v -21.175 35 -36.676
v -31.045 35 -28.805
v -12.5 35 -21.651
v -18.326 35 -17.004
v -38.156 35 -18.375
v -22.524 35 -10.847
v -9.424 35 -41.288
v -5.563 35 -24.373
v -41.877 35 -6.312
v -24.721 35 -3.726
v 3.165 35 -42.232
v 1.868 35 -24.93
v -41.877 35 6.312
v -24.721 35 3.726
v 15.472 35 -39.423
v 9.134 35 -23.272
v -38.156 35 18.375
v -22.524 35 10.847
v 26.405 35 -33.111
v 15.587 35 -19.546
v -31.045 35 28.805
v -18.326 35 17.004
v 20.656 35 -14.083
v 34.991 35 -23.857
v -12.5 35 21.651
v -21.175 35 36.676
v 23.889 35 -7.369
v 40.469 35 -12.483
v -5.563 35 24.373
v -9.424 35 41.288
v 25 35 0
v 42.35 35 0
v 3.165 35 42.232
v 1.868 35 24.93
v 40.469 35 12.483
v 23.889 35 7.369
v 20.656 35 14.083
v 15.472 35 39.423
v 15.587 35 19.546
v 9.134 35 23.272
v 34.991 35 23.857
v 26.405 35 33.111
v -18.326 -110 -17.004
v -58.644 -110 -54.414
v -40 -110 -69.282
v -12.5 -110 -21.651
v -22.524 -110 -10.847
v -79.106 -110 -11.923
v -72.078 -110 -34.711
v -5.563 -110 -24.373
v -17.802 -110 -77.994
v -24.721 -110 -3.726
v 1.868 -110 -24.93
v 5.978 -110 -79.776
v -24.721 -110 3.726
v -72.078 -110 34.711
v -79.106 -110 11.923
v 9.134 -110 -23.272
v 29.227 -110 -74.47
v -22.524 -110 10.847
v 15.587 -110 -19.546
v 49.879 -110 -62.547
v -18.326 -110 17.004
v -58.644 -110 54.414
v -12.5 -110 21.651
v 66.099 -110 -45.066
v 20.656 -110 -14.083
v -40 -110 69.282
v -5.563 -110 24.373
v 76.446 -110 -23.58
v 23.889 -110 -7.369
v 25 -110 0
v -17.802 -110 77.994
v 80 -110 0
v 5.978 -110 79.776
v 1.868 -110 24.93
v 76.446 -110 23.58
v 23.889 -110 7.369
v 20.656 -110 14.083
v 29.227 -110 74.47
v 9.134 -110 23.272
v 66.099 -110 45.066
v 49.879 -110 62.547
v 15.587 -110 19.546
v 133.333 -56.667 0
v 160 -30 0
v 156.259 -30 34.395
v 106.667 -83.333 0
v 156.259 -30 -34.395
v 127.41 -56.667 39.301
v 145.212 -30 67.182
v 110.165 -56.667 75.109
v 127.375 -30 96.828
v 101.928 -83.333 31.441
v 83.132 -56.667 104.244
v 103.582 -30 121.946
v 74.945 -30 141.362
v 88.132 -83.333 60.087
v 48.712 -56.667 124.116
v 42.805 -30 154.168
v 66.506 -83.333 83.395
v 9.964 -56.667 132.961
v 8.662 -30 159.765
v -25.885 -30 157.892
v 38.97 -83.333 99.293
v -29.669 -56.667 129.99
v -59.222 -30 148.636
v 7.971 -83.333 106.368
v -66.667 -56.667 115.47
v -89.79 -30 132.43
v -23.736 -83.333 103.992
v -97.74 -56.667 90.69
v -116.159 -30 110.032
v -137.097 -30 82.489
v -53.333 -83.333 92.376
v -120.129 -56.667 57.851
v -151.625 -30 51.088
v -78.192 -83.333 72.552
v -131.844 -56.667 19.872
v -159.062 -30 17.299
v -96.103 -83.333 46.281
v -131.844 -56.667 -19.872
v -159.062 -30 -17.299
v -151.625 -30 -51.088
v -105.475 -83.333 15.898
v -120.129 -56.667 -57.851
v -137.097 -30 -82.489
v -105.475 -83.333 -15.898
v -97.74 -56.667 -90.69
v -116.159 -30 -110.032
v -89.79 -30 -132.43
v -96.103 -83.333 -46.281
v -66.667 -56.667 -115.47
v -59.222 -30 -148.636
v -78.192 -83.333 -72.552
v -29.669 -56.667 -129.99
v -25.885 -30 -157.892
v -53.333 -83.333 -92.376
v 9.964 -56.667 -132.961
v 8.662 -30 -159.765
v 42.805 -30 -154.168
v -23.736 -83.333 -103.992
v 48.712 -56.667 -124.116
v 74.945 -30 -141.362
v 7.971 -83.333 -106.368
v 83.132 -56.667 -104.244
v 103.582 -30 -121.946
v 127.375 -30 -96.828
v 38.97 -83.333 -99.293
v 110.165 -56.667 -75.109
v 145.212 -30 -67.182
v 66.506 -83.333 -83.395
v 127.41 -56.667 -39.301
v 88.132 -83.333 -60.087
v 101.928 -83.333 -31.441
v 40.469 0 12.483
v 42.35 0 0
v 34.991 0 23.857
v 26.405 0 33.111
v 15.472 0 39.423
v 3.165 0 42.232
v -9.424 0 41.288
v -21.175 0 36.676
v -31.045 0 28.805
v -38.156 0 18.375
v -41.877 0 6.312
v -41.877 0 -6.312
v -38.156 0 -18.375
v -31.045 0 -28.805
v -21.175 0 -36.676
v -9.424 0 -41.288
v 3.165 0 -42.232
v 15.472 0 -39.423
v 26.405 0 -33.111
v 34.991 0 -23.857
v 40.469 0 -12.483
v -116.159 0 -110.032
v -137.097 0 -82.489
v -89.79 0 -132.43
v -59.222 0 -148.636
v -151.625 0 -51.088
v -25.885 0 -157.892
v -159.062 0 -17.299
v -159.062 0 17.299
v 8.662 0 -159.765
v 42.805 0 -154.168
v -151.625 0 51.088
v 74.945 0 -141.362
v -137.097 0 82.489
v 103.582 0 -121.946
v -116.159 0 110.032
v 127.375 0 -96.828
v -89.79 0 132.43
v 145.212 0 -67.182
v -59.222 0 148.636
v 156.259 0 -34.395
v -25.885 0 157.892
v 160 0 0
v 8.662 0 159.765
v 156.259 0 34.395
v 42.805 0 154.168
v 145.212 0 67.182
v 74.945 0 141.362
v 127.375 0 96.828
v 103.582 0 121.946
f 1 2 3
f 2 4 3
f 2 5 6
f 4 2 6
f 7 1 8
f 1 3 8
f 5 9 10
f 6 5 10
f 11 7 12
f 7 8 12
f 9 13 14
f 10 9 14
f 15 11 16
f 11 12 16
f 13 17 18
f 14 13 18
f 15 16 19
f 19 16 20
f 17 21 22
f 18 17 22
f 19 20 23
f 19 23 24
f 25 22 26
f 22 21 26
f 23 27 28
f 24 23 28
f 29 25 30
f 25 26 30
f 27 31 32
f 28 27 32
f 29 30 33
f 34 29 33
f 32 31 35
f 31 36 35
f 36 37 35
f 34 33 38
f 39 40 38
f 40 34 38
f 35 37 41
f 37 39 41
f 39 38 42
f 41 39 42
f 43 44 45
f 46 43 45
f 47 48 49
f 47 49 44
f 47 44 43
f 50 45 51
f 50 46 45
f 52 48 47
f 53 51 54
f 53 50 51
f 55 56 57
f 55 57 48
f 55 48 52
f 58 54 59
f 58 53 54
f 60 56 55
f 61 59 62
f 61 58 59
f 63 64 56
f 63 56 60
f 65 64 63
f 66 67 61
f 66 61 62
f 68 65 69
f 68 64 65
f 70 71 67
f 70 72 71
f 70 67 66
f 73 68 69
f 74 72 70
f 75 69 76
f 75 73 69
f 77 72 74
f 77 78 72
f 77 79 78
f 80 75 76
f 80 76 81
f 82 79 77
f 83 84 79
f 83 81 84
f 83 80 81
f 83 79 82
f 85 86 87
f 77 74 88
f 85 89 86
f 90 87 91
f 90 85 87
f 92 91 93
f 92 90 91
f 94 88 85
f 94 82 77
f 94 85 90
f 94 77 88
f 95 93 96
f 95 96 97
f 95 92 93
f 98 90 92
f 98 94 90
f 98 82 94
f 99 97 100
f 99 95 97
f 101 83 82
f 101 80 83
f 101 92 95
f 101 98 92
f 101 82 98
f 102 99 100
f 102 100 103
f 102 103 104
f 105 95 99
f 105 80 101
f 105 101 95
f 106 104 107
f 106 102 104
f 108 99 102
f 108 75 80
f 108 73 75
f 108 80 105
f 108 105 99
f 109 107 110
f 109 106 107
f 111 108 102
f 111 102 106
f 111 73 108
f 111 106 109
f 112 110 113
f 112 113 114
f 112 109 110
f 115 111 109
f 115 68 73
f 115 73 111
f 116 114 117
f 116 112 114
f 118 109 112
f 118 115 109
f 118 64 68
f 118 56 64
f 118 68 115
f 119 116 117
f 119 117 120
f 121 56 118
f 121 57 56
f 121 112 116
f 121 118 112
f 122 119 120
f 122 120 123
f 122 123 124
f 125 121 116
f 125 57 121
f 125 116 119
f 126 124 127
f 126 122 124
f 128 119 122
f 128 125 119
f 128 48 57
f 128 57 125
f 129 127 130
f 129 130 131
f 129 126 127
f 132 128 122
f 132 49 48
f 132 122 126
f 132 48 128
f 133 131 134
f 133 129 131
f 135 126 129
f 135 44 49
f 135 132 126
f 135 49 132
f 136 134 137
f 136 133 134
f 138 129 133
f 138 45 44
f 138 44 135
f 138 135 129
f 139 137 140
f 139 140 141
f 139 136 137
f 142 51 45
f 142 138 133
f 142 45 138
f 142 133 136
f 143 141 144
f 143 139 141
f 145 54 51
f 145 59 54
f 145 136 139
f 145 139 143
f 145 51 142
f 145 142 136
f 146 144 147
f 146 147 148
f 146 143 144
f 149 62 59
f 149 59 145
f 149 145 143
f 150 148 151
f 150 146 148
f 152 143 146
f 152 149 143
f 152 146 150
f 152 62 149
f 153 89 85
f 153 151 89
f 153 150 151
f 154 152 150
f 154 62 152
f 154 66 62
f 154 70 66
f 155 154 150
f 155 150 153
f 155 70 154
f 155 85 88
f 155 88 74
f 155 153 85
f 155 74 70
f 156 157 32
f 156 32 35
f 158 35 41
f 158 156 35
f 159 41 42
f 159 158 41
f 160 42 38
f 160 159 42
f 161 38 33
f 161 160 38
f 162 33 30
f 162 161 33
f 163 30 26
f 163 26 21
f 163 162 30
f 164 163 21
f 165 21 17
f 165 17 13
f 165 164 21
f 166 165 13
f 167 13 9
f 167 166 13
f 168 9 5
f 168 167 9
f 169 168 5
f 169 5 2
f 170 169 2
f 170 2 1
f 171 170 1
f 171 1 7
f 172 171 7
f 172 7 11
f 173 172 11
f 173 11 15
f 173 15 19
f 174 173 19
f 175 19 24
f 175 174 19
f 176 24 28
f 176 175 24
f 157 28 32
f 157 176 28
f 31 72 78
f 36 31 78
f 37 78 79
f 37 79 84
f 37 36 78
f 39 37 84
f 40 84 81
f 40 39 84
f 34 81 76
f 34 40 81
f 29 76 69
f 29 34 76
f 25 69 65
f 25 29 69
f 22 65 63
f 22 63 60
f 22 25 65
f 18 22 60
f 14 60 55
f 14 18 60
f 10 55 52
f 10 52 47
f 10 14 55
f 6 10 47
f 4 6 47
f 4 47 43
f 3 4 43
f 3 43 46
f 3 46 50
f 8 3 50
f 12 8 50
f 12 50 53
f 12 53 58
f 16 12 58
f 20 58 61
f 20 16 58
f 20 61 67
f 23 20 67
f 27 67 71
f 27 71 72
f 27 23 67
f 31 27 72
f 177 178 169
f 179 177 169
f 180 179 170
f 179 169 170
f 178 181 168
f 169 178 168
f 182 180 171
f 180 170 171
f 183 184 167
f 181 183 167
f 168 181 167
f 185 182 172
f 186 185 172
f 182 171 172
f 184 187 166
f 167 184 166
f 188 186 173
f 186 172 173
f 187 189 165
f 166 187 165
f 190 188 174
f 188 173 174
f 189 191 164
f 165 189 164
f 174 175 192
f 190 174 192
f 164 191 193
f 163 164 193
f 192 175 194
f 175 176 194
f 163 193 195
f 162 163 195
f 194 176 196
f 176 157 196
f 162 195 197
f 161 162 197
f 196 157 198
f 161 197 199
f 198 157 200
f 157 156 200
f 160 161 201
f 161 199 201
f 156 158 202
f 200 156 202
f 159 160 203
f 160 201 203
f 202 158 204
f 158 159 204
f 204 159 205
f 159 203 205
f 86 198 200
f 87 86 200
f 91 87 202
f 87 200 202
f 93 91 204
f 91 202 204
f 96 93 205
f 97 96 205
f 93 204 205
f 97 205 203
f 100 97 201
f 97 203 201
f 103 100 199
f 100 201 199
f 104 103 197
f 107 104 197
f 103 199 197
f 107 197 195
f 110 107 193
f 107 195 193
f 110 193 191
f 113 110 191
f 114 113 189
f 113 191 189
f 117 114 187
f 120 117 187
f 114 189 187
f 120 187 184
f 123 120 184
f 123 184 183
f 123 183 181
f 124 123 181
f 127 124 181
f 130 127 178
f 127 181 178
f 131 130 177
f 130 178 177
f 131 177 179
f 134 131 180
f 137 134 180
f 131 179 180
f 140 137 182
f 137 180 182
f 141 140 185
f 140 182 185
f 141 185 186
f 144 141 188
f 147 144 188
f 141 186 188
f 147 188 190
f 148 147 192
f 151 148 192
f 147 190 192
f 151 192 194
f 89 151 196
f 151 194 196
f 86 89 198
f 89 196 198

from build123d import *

# Parameters (mm, degrees)
F0_R     = 160
F0_R_2   = 42.35
F0_R_3   = 25
F1_DEPTH = 110
F2_DEPTH = 35
F3_SIZE  = 80


with BuildPart() as f1:
    # F0 (on Front) → F1 (new body)
    with BuildSketch(Plane.XZ):
        Circle(F0_R)
        Circle(F0_R_2, mode=Mode.SUBTRACT)
        Circle(F0_R_2)
        Circle(F0_R_3, mode=Mode.SUBTRACT)
    extrude(amount=F1_DEPTH)

    # F0 (on Front) → F2 (join)
    with BuildSketch(Plane.XZ):
        Circle(F0_R_2)
        Circle(F0_R_3, mode=Mode.SUBTRACT)
    extrude(amount=-F2_DEPTH)

    # F3
    f3_edges = [f1.edges().sort_by_distance(p)[0] for p in [
        (-160, -110, 0),
    ]]
    chamfer(f3_edges, length=F3_SIZE)


solid = f1.part
